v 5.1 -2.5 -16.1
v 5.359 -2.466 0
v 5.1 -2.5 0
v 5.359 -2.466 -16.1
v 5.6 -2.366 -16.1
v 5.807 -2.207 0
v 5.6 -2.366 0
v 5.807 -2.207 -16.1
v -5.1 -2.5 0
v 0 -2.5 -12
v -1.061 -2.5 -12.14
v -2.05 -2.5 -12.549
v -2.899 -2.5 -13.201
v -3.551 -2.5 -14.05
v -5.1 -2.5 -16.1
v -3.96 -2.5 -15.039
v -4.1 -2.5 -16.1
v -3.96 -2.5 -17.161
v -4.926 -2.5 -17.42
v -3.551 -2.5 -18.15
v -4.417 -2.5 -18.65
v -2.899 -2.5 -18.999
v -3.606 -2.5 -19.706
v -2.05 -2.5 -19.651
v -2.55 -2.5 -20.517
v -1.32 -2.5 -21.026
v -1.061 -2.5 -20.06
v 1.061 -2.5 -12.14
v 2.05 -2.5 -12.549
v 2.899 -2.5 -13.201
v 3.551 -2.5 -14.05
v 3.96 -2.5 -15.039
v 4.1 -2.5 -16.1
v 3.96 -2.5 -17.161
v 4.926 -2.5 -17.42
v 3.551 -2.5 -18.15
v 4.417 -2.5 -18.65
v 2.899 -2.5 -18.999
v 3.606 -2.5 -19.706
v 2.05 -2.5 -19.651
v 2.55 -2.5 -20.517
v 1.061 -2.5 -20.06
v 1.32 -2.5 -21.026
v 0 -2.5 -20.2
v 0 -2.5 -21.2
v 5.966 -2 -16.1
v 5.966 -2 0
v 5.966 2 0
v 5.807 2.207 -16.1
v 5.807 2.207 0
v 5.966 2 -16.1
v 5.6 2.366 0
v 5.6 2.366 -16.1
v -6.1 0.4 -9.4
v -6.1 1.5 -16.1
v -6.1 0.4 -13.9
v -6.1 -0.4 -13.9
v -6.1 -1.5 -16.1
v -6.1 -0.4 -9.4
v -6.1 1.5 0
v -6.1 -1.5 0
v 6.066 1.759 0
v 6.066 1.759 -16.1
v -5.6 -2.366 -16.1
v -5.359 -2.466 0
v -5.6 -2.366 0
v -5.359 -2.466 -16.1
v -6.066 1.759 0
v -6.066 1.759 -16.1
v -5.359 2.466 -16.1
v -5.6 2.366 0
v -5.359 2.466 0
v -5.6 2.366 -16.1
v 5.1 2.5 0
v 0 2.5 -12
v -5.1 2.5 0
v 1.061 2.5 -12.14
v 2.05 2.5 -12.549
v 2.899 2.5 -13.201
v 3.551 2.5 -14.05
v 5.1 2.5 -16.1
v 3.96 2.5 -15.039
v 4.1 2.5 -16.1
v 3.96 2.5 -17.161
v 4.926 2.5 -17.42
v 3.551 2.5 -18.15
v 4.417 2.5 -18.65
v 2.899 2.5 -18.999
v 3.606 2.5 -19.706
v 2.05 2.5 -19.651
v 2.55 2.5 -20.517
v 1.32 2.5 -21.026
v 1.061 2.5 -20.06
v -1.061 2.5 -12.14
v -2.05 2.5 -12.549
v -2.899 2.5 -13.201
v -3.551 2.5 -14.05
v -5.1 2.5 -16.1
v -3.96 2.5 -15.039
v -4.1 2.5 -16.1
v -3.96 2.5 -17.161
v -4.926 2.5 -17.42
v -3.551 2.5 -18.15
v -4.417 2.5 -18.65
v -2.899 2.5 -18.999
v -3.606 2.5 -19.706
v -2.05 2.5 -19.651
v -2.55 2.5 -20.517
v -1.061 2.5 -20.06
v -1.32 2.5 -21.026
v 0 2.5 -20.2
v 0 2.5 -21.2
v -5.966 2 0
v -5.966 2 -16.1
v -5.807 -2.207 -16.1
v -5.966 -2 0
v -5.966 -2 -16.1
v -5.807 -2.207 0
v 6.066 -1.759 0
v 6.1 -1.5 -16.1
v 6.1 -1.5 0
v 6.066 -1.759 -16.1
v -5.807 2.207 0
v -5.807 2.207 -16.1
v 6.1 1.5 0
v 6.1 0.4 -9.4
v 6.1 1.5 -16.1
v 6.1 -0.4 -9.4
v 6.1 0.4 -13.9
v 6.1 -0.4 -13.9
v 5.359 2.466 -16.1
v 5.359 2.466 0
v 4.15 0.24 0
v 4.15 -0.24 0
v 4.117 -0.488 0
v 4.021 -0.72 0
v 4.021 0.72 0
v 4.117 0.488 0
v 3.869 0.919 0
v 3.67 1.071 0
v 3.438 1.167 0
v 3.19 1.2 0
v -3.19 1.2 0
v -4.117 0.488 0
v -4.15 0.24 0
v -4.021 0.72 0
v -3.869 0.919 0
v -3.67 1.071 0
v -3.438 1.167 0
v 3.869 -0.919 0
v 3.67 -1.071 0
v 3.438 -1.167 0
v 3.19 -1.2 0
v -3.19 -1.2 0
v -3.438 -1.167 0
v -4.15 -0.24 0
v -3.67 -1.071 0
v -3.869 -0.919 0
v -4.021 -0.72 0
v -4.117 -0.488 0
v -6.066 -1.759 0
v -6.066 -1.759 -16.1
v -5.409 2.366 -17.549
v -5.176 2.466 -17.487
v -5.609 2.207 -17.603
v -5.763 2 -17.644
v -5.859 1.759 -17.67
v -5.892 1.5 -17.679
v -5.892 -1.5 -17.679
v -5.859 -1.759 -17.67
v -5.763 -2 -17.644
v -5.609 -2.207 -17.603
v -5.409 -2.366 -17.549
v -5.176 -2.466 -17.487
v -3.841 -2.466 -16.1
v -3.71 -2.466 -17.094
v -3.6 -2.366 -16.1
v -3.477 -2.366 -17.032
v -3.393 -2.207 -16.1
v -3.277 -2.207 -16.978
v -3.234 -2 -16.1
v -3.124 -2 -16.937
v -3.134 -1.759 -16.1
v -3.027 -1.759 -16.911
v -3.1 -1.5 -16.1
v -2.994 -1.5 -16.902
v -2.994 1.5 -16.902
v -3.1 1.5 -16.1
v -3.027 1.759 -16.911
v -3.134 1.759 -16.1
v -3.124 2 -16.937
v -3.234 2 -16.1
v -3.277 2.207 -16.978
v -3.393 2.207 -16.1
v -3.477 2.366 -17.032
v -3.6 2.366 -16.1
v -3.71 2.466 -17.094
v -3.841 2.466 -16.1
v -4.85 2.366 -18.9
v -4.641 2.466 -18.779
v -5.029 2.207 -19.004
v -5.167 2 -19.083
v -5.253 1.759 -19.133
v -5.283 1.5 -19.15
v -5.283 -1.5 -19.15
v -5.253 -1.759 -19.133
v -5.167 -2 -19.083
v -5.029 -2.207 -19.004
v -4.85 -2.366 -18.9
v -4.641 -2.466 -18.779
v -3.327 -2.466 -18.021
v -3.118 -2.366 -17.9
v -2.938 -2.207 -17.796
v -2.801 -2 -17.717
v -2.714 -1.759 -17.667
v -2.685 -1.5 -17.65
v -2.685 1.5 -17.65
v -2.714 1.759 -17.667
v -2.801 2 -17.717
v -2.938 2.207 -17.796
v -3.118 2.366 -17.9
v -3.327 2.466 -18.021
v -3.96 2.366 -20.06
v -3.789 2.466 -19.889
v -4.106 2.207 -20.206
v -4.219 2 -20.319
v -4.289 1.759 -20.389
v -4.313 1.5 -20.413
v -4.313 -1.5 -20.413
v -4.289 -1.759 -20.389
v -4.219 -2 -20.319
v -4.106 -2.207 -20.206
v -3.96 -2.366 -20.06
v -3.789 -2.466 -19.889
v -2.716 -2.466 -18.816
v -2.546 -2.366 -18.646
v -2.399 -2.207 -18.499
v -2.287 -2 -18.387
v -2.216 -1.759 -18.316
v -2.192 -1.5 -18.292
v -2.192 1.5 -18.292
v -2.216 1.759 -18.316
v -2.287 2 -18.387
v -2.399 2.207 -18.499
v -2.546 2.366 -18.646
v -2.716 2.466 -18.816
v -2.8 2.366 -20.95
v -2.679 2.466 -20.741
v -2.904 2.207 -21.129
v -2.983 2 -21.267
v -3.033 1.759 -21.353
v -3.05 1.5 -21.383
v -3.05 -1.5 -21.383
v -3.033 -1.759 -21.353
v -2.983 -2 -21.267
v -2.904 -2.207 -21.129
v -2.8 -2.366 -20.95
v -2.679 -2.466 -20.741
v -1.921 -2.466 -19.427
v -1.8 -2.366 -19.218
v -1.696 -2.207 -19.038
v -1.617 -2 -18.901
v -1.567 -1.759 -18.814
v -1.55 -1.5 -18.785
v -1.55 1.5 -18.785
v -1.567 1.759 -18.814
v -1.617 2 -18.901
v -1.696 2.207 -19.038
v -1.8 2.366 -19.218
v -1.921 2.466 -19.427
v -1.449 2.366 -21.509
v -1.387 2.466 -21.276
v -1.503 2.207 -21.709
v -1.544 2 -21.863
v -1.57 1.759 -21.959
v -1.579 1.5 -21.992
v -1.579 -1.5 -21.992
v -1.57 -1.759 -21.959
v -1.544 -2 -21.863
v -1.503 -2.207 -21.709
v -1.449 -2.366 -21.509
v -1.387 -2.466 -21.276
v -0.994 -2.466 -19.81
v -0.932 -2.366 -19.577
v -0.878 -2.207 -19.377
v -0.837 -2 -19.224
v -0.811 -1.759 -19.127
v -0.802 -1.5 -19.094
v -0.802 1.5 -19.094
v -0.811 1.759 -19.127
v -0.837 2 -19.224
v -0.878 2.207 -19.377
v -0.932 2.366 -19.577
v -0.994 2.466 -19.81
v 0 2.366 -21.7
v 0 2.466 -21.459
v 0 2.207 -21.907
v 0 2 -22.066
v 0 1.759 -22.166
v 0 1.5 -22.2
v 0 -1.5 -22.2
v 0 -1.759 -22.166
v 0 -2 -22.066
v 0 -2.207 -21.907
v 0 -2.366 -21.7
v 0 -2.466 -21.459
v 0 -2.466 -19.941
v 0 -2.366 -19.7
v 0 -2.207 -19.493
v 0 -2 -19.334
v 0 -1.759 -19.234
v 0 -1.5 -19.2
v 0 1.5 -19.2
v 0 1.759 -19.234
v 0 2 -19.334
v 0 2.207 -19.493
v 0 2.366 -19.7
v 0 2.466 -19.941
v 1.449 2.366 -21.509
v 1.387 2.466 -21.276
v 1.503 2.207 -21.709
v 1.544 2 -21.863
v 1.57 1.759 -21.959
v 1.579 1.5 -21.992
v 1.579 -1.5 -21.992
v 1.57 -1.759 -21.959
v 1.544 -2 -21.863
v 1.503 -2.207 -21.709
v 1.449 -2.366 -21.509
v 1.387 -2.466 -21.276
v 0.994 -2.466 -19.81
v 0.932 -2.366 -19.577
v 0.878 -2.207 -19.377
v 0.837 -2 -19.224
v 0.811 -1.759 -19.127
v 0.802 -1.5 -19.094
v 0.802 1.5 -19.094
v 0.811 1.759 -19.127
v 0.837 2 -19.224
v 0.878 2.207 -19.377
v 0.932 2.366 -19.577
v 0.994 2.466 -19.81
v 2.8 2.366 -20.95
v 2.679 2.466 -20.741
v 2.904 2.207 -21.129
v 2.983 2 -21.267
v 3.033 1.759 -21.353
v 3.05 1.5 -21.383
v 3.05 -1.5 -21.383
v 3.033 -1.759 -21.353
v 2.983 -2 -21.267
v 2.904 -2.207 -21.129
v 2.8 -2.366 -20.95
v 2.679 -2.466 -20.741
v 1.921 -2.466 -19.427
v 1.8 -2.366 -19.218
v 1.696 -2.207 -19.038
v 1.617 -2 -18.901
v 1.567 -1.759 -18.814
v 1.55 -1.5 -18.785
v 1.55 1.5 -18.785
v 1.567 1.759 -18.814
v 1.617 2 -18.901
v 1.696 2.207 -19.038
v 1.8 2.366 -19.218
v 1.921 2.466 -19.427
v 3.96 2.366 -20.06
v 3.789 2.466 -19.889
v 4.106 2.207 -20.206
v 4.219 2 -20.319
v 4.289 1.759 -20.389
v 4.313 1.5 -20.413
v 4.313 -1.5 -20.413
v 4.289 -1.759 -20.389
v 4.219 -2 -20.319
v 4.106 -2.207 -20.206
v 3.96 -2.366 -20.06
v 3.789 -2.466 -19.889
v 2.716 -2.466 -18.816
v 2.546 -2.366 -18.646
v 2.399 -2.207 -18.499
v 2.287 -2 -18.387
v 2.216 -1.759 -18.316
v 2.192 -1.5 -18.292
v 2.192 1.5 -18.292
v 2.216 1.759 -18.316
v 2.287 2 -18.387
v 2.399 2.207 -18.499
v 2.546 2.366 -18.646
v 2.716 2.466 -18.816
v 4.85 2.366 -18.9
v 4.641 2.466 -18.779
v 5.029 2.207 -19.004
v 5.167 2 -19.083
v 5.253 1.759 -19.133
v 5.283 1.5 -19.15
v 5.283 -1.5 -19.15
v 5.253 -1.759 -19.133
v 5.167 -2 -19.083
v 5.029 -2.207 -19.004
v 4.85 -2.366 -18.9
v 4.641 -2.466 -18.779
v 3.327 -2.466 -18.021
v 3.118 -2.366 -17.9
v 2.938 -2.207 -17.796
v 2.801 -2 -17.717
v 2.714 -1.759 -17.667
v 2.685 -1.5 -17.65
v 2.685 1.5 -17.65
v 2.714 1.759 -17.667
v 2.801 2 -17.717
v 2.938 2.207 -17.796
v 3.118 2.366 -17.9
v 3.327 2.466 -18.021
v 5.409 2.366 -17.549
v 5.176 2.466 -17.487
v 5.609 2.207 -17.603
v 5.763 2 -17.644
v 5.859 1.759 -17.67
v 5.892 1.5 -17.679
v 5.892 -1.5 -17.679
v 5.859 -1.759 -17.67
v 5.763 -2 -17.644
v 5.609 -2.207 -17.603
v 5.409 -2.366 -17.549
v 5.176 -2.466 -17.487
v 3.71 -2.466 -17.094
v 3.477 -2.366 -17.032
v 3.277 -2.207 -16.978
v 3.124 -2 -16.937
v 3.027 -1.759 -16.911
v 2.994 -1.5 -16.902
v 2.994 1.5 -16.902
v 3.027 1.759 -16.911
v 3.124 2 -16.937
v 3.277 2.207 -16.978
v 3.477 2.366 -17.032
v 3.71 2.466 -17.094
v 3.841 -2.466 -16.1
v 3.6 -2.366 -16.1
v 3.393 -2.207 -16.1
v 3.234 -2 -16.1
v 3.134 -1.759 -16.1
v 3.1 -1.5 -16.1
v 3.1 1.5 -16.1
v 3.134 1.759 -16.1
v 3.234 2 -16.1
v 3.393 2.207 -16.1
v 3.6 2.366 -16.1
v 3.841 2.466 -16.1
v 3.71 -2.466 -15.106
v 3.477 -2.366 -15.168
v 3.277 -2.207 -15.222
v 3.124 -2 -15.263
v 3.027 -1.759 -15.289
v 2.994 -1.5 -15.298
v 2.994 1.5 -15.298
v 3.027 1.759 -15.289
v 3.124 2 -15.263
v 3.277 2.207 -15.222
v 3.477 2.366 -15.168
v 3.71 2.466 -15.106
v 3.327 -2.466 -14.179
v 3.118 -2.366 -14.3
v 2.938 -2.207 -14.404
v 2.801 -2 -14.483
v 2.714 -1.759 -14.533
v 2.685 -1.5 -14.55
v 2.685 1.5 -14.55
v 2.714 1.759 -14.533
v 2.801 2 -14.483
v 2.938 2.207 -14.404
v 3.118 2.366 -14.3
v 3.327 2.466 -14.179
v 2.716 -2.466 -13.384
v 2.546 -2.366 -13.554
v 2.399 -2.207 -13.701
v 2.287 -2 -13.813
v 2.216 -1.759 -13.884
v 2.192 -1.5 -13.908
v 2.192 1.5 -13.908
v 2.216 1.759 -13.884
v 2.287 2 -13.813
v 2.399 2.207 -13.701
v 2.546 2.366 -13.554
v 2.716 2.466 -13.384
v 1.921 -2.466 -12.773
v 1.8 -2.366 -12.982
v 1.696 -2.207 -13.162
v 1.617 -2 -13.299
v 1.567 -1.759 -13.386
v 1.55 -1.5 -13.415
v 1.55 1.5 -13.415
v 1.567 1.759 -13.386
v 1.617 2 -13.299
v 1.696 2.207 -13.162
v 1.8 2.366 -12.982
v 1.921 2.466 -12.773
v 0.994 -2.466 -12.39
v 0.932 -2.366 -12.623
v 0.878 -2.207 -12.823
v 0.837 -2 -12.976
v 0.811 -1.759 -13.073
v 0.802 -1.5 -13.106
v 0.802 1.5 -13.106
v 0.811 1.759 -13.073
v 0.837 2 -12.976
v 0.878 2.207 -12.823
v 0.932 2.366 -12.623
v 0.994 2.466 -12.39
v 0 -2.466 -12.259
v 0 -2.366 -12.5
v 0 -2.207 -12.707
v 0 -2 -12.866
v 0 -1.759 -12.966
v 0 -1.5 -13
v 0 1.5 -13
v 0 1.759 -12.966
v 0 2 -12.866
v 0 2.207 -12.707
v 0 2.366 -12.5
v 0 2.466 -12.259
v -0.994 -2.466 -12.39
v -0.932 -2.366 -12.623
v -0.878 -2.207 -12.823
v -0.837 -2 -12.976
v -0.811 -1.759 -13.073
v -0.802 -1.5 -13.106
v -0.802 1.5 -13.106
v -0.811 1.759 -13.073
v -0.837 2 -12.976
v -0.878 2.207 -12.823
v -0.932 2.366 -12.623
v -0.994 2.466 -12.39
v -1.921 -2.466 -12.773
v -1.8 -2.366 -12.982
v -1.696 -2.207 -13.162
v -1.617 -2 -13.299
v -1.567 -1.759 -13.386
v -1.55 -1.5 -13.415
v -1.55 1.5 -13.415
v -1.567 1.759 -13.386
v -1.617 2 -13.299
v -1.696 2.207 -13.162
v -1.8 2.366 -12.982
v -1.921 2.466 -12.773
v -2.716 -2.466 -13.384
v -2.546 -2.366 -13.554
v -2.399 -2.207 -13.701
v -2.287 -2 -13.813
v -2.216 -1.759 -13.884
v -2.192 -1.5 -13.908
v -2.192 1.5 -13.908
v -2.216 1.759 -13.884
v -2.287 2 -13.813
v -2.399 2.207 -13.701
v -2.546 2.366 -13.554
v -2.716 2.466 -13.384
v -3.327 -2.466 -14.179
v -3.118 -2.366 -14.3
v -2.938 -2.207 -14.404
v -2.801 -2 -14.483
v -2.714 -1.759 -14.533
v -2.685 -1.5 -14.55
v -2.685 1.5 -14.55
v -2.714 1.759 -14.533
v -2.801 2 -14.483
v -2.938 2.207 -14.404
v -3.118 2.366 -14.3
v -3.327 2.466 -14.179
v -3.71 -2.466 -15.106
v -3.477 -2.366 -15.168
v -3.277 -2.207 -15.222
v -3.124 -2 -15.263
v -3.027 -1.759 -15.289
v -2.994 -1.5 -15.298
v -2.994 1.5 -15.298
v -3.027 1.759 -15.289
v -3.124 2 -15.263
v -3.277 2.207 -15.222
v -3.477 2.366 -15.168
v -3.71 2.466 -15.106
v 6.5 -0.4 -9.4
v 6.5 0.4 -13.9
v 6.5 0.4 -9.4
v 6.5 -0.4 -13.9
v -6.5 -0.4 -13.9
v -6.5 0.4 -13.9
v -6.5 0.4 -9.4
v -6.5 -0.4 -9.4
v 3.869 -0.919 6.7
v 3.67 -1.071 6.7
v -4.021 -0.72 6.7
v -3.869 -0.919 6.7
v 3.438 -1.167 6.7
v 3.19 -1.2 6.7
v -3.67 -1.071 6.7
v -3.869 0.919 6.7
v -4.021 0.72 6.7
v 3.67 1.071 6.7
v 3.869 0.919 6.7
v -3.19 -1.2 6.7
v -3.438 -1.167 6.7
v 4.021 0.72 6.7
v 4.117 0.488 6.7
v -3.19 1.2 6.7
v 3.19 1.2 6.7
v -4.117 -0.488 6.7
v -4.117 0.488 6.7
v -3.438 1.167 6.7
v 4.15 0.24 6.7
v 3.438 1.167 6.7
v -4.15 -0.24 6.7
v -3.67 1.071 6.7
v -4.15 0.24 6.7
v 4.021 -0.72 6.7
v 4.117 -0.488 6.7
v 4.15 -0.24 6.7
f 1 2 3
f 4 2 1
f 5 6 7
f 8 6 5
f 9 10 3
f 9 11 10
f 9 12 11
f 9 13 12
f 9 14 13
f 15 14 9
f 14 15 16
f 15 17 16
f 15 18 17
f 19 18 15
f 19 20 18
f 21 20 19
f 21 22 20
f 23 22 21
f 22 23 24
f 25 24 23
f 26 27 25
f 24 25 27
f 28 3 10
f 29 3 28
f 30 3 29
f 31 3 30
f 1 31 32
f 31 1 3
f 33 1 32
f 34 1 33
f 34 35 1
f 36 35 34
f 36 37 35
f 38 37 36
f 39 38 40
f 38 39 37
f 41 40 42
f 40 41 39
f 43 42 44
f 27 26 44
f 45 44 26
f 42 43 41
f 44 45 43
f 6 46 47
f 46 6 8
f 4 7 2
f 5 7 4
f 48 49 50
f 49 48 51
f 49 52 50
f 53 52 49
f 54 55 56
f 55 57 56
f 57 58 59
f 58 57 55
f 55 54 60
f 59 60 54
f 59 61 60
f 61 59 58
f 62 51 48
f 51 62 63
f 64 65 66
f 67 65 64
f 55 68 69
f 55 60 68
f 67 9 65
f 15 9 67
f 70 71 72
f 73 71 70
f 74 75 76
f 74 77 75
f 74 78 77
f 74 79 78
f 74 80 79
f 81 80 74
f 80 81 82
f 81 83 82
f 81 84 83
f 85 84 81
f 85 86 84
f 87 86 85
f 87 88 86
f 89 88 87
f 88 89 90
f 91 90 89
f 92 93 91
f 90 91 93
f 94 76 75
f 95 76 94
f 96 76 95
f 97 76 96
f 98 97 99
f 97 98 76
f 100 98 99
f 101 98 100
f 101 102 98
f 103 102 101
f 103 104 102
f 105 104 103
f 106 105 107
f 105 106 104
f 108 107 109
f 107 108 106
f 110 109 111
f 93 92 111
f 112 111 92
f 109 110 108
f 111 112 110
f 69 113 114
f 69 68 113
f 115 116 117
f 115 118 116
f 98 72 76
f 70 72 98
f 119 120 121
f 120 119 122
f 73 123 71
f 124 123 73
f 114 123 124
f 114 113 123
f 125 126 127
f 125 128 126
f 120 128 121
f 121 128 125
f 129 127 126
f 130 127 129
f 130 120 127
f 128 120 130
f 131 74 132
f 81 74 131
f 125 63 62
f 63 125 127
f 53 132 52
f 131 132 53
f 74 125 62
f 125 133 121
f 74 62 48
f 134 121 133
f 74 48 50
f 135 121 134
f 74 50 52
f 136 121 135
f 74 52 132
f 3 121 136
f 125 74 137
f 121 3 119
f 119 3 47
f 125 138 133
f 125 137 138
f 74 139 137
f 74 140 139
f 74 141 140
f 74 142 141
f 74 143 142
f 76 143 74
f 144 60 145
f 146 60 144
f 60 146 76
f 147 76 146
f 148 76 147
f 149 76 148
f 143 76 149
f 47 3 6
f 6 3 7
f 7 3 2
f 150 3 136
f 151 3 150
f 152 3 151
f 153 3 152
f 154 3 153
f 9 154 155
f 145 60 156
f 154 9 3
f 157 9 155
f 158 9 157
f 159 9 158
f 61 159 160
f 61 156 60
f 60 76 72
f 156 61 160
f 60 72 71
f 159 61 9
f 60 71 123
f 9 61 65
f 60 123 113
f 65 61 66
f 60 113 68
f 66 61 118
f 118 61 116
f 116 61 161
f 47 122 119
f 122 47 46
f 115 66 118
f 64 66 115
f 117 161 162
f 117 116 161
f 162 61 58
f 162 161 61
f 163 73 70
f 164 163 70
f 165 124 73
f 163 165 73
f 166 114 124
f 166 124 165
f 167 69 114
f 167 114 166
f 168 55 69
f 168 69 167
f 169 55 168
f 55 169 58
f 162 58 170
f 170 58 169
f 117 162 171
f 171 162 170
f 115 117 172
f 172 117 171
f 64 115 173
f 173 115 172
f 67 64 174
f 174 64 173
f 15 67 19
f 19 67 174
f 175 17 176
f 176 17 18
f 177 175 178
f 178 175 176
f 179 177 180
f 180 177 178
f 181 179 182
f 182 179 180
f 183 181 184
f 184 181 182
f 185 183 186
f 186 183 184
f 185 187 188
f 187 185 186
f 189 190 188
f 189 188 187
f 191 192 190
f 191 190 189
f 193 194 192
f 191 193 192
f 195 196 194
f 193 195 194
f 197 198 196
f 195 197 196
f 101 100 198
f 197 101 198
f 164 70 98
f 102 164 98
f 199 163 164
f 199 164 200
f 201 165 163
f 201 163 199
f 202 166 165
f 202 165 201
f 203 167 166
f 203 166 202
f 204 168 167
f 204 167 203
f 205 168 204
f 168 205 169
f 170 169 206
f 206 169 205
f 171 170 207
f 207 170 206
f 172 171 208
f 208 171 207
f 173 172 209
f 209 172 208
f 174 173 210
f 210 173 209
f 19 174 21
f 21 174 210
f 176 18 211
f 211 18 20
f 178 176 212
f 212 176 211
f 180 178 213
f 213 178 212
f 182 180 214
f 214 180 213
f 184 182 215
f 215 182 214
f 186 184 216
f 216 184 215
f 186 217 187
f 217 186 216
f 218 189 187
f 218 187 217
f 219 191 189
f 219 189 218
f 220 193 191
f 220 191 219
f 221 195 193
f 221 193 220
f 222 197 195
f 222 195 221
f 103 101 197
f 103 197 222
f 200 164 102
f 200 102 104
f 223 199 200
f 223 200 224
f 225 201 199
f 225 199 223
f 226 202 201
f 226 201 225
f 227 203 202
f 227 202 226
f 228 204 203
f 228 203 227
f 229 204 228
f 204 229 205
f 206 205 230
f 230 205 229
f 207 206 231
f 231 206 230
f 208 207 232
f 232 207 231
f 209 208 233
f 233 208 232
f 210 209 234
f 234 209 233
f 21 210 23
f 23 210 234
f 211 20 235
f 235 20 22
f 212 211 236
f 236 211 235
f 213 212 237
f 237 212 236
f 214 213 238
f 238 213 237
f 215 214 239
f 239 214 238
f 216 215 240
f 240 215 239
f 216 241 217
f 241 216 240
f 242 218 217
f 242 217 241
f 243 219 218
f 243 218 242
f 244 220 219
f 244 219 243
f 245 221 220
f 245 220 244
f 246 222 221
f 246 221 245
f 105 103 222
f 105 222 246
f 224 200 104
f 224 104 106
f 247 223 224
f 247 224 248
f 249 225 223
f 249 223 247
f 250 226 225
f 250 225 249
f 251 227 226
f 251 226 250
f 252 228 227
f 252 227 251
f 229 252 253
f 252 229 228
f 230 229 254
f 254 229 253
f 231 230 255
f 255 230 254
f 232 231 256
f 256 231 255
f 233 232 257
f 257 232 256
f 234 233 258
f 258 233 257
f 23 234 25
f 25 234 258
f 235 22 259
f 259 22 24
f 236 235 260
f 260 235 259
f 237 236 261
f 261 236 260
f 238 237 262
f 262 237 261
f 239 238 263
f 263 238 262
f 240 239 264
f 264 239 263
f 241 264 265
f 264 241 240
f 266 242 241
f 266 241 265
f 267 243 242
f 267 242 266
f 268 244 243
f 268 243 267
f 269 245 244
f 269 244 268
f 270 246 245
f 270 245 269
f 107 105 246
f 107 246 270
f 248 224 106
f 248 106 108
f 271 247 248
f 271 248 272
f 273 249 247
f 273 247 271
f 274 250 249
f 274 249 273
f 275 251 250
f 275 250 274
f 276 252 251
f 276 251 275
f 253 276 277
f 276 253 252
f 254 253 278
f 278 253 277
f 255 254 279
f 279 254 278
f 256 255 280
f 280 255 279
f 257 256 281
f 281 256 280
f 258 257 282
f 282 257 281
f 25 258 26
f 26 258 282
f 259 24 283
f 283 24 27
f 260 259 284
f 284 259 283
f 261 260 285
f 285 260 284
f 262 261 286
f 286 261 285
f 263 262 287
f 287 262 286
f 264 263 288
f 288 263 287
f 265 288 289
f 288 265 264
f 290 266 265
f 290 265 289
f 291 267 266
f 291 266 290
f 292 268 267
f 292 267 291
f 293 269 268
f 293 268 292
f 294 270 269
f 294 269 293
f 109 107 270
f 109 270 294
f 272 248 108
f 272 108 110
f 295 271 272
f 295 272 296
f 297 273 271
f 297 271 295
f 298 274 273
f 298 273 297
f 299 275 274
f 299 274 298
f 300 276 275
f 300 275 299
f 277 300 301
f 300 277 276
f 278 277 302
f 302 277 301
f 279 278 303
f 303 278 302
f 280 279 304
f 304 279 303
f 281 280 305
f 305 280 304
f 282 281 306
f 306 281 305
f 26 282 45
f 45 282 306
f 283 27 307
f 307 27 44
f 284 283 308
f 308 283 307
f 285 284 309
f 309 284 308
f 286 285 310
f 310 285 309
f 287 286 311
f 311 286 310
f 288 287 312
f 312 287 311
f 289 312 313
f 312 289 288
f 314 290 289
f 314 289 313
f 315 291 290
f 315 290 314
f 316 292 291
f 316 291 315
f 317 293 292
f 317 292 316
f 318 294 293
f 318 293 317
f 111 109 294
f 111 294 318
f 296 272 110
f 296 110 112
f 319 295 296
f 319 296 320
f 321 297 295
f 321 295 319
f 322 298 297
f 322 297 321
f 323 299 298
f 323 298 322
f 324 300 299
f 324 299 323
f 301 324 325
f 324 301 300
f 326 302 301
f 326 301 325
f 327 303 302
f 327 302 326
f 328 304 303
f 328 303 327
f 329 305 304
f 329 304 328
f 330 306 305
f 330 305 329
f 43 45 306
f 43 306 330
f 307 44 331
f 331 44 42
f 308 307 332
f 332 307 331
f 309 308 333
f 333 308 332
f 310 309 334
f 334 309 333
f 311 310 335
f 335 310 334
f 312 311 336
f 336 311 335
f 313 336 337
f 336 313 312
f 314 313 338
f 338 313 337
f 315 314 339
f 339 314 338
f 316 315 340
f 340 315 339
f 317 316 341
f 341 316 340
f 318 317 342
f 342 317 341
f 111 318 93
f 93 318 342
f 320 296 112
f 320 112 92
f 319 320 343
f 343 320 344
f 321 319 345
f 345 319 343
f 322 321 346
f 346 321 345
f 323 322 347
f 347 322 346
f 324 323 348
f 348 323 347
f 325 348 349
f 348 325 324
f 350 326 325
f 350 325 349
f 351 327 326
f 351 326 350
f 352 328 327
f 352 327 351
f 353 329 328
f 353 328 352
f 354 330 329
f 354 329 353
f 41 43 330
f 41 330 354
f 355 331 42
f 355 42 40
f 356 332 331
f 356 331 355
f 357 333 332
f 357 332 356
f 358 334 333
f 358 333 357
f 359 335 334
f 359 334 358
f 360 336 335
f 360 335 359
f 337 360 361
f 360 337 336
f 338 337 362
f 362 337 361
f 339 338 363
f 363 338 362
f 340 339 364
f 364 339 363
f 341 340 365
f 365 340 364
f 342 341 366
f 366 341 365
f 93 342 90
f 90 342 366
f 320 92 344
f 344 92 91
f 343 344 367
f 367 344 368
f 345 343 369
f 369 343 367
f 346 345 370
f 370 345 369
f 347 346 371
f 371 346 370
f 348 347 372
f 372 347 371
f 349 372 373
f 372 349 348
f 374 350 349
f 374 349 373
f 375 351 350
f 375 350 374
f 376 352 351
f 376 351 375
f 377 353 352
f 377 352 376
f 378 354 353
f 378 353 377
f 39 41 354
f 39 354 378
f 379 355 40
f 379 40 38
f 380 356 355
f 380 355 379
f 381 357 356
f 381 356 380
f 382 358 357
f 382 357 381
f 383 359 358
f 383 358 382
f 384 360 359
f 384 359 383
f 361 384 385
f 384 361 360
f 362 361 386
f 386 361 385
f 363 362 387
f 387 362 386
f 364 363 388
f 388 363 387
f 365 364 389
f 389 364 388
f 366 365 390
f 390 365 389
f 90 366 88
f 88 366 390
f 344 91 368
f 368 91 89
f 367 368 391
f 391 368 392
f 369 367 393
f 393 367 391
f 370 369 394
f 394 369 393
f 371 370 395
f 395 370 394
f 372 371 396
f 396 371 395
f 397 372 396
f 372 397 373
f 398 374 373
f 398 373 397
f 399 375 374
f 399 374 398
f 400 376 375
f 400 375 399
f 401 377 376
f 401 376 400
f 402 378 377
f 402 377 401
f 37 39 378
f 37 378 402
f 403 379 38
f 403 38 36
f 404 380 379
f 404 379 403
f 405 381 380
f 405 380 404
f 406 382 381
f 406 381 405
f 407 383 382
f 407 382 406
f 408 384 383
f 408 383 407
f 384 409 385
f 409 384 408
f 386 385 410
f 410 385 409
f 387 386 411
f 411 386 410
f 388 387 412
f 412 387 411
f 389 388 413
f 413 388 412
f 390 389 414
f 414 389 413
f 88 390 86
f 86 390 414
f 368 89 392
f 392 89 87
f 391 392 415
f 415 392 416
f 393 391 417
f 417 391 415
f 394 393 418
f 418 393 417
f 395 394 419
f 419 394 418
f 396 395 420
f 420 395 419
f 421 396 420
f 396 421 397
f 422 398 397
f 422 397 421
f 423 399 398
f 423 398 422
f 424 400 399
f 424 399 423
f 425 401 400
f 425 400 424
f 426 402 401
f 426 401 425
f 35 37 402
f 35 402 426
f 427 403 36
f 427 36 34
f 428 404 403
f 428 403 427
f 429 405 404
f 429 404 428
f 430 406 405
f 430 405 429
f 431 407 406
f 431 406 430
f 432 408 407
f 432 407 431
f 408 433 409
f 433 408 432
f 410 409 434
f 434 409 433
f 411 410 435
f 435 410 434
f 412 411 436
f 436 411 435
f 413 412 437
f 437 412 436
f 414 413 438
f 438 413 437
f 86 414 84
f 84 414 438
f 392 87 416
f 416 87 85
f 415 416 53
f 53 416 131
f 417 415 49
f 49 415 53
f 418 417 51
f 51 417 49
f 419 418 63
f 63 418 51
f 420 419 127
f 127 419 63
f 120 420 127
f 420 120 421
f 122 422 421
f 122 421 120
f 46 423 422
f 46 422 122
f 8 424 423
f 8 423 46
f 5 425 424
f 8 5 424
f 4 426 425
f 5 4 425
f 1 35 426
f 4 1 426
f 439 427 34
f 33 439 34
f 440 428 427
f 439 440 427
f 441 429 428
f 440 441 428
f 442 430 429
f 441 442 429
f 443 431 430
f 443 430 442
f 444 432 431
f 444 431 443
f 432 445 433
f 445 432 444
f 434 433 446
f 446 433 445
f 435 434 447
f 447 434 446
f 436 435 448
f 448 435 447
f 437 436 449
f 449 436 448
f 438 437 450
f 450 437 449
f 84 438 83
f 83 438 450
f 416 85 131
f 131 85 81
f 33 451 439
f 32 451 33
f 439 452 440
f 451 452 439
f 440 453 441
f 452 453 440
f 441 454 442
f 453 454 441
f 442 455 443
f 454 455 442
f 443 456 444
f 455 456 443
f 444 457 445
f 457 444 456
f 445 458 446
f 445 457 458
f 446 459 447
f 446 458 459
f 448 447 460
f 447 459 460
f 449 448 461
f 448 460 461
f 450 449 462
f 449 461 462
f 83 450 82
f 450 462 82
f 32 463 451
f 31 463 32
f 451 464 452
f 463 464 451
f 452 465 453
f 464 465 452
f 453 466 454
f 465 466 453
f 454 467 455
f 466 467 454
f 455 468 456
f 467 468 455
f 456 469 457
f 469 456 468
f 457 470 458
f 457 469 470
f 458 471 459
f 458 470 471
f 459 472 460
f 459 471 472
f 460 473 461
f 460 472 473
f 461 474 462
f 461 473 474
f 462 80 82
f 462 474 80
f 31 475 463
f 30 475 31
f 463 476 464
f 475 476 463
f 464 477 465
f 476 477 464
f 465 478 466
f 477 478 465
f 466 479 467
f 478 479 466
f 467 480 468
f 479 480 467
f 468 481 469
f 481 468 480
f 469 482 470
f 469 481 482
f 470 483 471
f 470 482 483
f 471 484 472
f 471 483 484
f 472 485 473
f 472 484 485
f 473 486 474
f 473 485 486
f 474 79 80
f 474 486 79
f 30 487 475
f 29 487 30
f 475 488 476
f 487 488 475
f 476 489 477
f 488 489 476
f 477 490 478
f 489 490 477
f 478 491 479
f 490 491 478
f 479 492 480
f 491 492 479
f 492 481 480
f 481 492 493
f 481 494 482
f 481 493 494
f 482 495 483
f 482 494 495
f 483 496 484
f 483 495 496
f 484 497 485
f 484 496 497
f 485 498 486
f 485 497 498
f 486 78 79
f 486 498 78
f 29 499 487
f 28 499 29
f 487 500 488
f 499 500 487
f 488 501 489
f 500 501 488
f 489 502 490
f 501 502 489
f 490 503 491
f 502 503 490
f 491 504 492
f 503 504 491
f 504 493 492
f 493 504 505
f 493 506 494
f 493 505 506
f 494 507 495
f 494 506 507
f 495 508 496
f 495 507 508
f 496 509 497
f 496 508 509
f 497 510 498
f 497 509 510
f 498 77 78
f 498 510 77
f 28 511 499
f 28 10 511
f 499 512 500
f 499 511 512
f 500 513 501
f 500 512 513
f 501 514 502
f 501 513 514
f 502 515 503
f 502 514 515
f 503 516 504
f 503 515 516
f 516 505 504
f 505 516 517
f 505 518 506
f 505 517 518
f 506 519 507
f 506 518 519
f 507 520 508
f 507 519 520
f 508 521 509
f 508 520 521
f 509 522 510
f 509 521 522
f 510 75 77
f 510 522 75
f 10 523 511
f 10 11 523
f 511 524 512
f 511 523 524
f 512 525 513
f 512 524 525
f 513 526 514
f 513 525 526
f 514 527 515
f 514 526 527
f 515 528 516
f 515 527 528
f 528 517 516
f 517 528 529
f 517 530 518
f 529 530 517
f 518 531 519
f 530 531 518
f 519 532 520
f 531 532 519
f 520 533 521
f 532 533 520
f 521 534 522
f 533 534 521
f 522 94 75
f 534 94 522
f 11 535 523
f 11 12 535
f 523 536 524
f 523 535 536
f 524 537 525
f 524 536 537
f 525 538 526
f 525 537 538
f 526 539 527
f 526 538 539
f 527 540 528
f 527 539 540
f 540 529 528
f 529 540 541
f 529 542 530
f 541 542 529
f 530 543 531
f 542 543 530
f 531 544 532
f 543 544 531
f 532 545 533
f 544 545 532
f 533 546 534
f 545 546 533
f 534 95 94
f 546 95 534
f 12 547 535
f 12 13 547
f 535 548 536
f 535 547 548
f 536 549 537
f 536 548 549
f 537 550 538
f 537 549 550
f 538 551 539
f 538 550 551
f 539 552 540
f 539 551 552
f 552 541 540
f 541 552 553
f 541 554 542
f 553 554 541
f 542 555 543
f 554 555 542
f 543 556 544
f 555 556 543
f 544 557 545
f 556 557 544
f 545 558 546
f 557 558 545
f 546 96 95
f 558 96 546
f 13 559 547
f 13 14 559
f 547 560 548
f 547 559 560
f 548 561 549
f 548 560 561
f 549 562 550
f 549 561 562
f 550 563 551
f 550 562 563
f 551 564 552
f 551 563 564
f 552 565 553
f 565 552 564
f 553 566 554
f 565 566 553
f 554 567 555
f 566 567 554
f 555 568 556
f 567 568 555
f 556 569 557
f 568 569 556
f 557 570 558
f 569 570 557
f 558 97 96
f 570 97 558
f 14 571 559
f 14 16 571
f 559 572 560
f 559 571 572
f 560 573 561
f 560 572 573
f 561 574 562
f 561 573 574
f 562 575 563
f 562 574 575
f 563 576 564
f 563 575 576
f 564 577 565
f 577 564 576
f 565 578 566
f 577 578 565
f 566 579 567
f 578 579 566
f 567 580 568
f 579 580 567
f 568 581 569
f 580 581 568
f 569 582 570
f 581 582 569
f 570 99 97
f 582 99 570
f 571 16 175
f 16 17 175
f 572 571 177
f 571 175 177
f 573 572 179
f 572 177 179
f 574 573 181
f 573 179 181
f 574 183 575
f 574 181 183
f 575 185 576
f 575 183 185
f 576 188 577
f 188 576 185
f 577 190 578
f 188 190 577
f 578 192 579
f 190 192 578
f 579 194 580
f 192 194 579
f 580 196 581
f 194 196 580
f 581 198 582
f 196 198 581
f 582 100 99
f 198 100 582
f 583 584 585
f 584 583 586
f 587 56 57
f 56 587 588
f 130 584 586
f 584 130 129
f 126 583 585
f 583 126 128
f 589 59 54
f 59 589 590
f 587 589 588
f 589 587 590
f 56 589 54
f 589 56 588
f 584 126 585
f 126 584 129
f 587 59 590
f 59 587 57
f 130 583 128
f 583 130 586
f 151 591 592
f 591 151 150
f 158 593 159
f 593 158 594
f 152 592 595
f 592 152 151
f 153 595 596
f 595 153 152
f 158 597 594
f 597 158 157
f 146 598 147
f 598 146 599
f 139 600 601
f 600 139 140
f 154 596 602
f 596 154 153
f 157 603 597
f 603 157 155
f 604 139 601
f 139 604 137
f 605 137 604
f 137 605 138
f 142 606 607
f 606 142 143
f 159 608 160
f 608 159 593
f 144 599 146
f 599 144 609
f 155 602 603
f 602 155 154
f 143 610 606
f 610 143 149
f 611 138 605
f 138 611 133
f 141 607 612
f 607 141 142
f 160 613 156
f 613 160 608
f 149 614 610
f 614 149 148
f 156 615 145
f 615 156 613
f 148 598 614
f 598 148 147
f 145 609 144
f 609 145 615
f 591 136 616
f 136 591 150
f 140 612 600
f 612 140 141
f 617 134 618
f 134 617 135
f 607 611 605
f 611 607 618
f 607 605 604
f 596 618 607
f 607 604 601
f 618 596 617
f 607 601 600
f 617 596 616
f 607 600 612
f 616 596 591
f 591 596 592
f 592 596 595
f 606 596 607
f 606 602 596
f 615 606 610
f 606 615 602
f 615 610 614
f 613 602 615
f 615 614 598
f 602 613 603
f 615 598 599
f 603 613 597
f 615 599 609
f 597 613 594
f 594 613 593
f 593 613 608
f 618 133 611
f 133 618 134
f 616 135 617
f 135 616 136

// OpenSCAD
T = 0.01;

module yubikey_5c() {
    $fn = 24;

    module connector() {
        dim = [8.3, 2.4, 6.7];

        r = min(dim.x, dim.y);

        color("#888")
        linear_extrude(dim.z)
        offset(r * 0.4)
        offset(- r * 0.4)
        square([dim.x, dim.y], center = true);
    }
    
    module body_plastic() {
        r = 1;

        color("#444")
        mirror([0, 0, 1]) {
            dim = [12.2, 5, 10];
            
            ring_t = 3;

            difference() {
                linear_extrude(dim.z + dim.x / 2)
                offset(r)
                offset(-r)
                square([dim.x, dim.y], center = true);
                
                translate([0, 0, dim.z + dim.x / 2])
                rotate([90, 0, 0])
                cylinder(h = dim.y + T, r = dim.x / 2 - ring_t / 2, center = true);
            }

            translate([0, 0, dim.z + dim.x / 2])
            rotate([90, 0, 0])
            rotate_extrude()
            translate([dim.x / 2 - ring_t / 2, 0])
            offset(r)
            offset(-r)
            square([ring_t, dim.y], center = true);
        }
    }
    
    module body_metal() {
        offset_z = 9.4;
        
        dim = [13.0, 0.8, 4.5];
        
        color("#884")
        mirror([0, 0, 1])
        translate([0, 0, offset_z + dim.z / 2])
        difference() {
            cube(dim, center = true);
            
            cube([dim.x - 2, dim.y + T, dim.z + T], center = true);
        }
    }
    
    connector();
    body_plastic();
    body_metal();
}

yubikey_5c();
